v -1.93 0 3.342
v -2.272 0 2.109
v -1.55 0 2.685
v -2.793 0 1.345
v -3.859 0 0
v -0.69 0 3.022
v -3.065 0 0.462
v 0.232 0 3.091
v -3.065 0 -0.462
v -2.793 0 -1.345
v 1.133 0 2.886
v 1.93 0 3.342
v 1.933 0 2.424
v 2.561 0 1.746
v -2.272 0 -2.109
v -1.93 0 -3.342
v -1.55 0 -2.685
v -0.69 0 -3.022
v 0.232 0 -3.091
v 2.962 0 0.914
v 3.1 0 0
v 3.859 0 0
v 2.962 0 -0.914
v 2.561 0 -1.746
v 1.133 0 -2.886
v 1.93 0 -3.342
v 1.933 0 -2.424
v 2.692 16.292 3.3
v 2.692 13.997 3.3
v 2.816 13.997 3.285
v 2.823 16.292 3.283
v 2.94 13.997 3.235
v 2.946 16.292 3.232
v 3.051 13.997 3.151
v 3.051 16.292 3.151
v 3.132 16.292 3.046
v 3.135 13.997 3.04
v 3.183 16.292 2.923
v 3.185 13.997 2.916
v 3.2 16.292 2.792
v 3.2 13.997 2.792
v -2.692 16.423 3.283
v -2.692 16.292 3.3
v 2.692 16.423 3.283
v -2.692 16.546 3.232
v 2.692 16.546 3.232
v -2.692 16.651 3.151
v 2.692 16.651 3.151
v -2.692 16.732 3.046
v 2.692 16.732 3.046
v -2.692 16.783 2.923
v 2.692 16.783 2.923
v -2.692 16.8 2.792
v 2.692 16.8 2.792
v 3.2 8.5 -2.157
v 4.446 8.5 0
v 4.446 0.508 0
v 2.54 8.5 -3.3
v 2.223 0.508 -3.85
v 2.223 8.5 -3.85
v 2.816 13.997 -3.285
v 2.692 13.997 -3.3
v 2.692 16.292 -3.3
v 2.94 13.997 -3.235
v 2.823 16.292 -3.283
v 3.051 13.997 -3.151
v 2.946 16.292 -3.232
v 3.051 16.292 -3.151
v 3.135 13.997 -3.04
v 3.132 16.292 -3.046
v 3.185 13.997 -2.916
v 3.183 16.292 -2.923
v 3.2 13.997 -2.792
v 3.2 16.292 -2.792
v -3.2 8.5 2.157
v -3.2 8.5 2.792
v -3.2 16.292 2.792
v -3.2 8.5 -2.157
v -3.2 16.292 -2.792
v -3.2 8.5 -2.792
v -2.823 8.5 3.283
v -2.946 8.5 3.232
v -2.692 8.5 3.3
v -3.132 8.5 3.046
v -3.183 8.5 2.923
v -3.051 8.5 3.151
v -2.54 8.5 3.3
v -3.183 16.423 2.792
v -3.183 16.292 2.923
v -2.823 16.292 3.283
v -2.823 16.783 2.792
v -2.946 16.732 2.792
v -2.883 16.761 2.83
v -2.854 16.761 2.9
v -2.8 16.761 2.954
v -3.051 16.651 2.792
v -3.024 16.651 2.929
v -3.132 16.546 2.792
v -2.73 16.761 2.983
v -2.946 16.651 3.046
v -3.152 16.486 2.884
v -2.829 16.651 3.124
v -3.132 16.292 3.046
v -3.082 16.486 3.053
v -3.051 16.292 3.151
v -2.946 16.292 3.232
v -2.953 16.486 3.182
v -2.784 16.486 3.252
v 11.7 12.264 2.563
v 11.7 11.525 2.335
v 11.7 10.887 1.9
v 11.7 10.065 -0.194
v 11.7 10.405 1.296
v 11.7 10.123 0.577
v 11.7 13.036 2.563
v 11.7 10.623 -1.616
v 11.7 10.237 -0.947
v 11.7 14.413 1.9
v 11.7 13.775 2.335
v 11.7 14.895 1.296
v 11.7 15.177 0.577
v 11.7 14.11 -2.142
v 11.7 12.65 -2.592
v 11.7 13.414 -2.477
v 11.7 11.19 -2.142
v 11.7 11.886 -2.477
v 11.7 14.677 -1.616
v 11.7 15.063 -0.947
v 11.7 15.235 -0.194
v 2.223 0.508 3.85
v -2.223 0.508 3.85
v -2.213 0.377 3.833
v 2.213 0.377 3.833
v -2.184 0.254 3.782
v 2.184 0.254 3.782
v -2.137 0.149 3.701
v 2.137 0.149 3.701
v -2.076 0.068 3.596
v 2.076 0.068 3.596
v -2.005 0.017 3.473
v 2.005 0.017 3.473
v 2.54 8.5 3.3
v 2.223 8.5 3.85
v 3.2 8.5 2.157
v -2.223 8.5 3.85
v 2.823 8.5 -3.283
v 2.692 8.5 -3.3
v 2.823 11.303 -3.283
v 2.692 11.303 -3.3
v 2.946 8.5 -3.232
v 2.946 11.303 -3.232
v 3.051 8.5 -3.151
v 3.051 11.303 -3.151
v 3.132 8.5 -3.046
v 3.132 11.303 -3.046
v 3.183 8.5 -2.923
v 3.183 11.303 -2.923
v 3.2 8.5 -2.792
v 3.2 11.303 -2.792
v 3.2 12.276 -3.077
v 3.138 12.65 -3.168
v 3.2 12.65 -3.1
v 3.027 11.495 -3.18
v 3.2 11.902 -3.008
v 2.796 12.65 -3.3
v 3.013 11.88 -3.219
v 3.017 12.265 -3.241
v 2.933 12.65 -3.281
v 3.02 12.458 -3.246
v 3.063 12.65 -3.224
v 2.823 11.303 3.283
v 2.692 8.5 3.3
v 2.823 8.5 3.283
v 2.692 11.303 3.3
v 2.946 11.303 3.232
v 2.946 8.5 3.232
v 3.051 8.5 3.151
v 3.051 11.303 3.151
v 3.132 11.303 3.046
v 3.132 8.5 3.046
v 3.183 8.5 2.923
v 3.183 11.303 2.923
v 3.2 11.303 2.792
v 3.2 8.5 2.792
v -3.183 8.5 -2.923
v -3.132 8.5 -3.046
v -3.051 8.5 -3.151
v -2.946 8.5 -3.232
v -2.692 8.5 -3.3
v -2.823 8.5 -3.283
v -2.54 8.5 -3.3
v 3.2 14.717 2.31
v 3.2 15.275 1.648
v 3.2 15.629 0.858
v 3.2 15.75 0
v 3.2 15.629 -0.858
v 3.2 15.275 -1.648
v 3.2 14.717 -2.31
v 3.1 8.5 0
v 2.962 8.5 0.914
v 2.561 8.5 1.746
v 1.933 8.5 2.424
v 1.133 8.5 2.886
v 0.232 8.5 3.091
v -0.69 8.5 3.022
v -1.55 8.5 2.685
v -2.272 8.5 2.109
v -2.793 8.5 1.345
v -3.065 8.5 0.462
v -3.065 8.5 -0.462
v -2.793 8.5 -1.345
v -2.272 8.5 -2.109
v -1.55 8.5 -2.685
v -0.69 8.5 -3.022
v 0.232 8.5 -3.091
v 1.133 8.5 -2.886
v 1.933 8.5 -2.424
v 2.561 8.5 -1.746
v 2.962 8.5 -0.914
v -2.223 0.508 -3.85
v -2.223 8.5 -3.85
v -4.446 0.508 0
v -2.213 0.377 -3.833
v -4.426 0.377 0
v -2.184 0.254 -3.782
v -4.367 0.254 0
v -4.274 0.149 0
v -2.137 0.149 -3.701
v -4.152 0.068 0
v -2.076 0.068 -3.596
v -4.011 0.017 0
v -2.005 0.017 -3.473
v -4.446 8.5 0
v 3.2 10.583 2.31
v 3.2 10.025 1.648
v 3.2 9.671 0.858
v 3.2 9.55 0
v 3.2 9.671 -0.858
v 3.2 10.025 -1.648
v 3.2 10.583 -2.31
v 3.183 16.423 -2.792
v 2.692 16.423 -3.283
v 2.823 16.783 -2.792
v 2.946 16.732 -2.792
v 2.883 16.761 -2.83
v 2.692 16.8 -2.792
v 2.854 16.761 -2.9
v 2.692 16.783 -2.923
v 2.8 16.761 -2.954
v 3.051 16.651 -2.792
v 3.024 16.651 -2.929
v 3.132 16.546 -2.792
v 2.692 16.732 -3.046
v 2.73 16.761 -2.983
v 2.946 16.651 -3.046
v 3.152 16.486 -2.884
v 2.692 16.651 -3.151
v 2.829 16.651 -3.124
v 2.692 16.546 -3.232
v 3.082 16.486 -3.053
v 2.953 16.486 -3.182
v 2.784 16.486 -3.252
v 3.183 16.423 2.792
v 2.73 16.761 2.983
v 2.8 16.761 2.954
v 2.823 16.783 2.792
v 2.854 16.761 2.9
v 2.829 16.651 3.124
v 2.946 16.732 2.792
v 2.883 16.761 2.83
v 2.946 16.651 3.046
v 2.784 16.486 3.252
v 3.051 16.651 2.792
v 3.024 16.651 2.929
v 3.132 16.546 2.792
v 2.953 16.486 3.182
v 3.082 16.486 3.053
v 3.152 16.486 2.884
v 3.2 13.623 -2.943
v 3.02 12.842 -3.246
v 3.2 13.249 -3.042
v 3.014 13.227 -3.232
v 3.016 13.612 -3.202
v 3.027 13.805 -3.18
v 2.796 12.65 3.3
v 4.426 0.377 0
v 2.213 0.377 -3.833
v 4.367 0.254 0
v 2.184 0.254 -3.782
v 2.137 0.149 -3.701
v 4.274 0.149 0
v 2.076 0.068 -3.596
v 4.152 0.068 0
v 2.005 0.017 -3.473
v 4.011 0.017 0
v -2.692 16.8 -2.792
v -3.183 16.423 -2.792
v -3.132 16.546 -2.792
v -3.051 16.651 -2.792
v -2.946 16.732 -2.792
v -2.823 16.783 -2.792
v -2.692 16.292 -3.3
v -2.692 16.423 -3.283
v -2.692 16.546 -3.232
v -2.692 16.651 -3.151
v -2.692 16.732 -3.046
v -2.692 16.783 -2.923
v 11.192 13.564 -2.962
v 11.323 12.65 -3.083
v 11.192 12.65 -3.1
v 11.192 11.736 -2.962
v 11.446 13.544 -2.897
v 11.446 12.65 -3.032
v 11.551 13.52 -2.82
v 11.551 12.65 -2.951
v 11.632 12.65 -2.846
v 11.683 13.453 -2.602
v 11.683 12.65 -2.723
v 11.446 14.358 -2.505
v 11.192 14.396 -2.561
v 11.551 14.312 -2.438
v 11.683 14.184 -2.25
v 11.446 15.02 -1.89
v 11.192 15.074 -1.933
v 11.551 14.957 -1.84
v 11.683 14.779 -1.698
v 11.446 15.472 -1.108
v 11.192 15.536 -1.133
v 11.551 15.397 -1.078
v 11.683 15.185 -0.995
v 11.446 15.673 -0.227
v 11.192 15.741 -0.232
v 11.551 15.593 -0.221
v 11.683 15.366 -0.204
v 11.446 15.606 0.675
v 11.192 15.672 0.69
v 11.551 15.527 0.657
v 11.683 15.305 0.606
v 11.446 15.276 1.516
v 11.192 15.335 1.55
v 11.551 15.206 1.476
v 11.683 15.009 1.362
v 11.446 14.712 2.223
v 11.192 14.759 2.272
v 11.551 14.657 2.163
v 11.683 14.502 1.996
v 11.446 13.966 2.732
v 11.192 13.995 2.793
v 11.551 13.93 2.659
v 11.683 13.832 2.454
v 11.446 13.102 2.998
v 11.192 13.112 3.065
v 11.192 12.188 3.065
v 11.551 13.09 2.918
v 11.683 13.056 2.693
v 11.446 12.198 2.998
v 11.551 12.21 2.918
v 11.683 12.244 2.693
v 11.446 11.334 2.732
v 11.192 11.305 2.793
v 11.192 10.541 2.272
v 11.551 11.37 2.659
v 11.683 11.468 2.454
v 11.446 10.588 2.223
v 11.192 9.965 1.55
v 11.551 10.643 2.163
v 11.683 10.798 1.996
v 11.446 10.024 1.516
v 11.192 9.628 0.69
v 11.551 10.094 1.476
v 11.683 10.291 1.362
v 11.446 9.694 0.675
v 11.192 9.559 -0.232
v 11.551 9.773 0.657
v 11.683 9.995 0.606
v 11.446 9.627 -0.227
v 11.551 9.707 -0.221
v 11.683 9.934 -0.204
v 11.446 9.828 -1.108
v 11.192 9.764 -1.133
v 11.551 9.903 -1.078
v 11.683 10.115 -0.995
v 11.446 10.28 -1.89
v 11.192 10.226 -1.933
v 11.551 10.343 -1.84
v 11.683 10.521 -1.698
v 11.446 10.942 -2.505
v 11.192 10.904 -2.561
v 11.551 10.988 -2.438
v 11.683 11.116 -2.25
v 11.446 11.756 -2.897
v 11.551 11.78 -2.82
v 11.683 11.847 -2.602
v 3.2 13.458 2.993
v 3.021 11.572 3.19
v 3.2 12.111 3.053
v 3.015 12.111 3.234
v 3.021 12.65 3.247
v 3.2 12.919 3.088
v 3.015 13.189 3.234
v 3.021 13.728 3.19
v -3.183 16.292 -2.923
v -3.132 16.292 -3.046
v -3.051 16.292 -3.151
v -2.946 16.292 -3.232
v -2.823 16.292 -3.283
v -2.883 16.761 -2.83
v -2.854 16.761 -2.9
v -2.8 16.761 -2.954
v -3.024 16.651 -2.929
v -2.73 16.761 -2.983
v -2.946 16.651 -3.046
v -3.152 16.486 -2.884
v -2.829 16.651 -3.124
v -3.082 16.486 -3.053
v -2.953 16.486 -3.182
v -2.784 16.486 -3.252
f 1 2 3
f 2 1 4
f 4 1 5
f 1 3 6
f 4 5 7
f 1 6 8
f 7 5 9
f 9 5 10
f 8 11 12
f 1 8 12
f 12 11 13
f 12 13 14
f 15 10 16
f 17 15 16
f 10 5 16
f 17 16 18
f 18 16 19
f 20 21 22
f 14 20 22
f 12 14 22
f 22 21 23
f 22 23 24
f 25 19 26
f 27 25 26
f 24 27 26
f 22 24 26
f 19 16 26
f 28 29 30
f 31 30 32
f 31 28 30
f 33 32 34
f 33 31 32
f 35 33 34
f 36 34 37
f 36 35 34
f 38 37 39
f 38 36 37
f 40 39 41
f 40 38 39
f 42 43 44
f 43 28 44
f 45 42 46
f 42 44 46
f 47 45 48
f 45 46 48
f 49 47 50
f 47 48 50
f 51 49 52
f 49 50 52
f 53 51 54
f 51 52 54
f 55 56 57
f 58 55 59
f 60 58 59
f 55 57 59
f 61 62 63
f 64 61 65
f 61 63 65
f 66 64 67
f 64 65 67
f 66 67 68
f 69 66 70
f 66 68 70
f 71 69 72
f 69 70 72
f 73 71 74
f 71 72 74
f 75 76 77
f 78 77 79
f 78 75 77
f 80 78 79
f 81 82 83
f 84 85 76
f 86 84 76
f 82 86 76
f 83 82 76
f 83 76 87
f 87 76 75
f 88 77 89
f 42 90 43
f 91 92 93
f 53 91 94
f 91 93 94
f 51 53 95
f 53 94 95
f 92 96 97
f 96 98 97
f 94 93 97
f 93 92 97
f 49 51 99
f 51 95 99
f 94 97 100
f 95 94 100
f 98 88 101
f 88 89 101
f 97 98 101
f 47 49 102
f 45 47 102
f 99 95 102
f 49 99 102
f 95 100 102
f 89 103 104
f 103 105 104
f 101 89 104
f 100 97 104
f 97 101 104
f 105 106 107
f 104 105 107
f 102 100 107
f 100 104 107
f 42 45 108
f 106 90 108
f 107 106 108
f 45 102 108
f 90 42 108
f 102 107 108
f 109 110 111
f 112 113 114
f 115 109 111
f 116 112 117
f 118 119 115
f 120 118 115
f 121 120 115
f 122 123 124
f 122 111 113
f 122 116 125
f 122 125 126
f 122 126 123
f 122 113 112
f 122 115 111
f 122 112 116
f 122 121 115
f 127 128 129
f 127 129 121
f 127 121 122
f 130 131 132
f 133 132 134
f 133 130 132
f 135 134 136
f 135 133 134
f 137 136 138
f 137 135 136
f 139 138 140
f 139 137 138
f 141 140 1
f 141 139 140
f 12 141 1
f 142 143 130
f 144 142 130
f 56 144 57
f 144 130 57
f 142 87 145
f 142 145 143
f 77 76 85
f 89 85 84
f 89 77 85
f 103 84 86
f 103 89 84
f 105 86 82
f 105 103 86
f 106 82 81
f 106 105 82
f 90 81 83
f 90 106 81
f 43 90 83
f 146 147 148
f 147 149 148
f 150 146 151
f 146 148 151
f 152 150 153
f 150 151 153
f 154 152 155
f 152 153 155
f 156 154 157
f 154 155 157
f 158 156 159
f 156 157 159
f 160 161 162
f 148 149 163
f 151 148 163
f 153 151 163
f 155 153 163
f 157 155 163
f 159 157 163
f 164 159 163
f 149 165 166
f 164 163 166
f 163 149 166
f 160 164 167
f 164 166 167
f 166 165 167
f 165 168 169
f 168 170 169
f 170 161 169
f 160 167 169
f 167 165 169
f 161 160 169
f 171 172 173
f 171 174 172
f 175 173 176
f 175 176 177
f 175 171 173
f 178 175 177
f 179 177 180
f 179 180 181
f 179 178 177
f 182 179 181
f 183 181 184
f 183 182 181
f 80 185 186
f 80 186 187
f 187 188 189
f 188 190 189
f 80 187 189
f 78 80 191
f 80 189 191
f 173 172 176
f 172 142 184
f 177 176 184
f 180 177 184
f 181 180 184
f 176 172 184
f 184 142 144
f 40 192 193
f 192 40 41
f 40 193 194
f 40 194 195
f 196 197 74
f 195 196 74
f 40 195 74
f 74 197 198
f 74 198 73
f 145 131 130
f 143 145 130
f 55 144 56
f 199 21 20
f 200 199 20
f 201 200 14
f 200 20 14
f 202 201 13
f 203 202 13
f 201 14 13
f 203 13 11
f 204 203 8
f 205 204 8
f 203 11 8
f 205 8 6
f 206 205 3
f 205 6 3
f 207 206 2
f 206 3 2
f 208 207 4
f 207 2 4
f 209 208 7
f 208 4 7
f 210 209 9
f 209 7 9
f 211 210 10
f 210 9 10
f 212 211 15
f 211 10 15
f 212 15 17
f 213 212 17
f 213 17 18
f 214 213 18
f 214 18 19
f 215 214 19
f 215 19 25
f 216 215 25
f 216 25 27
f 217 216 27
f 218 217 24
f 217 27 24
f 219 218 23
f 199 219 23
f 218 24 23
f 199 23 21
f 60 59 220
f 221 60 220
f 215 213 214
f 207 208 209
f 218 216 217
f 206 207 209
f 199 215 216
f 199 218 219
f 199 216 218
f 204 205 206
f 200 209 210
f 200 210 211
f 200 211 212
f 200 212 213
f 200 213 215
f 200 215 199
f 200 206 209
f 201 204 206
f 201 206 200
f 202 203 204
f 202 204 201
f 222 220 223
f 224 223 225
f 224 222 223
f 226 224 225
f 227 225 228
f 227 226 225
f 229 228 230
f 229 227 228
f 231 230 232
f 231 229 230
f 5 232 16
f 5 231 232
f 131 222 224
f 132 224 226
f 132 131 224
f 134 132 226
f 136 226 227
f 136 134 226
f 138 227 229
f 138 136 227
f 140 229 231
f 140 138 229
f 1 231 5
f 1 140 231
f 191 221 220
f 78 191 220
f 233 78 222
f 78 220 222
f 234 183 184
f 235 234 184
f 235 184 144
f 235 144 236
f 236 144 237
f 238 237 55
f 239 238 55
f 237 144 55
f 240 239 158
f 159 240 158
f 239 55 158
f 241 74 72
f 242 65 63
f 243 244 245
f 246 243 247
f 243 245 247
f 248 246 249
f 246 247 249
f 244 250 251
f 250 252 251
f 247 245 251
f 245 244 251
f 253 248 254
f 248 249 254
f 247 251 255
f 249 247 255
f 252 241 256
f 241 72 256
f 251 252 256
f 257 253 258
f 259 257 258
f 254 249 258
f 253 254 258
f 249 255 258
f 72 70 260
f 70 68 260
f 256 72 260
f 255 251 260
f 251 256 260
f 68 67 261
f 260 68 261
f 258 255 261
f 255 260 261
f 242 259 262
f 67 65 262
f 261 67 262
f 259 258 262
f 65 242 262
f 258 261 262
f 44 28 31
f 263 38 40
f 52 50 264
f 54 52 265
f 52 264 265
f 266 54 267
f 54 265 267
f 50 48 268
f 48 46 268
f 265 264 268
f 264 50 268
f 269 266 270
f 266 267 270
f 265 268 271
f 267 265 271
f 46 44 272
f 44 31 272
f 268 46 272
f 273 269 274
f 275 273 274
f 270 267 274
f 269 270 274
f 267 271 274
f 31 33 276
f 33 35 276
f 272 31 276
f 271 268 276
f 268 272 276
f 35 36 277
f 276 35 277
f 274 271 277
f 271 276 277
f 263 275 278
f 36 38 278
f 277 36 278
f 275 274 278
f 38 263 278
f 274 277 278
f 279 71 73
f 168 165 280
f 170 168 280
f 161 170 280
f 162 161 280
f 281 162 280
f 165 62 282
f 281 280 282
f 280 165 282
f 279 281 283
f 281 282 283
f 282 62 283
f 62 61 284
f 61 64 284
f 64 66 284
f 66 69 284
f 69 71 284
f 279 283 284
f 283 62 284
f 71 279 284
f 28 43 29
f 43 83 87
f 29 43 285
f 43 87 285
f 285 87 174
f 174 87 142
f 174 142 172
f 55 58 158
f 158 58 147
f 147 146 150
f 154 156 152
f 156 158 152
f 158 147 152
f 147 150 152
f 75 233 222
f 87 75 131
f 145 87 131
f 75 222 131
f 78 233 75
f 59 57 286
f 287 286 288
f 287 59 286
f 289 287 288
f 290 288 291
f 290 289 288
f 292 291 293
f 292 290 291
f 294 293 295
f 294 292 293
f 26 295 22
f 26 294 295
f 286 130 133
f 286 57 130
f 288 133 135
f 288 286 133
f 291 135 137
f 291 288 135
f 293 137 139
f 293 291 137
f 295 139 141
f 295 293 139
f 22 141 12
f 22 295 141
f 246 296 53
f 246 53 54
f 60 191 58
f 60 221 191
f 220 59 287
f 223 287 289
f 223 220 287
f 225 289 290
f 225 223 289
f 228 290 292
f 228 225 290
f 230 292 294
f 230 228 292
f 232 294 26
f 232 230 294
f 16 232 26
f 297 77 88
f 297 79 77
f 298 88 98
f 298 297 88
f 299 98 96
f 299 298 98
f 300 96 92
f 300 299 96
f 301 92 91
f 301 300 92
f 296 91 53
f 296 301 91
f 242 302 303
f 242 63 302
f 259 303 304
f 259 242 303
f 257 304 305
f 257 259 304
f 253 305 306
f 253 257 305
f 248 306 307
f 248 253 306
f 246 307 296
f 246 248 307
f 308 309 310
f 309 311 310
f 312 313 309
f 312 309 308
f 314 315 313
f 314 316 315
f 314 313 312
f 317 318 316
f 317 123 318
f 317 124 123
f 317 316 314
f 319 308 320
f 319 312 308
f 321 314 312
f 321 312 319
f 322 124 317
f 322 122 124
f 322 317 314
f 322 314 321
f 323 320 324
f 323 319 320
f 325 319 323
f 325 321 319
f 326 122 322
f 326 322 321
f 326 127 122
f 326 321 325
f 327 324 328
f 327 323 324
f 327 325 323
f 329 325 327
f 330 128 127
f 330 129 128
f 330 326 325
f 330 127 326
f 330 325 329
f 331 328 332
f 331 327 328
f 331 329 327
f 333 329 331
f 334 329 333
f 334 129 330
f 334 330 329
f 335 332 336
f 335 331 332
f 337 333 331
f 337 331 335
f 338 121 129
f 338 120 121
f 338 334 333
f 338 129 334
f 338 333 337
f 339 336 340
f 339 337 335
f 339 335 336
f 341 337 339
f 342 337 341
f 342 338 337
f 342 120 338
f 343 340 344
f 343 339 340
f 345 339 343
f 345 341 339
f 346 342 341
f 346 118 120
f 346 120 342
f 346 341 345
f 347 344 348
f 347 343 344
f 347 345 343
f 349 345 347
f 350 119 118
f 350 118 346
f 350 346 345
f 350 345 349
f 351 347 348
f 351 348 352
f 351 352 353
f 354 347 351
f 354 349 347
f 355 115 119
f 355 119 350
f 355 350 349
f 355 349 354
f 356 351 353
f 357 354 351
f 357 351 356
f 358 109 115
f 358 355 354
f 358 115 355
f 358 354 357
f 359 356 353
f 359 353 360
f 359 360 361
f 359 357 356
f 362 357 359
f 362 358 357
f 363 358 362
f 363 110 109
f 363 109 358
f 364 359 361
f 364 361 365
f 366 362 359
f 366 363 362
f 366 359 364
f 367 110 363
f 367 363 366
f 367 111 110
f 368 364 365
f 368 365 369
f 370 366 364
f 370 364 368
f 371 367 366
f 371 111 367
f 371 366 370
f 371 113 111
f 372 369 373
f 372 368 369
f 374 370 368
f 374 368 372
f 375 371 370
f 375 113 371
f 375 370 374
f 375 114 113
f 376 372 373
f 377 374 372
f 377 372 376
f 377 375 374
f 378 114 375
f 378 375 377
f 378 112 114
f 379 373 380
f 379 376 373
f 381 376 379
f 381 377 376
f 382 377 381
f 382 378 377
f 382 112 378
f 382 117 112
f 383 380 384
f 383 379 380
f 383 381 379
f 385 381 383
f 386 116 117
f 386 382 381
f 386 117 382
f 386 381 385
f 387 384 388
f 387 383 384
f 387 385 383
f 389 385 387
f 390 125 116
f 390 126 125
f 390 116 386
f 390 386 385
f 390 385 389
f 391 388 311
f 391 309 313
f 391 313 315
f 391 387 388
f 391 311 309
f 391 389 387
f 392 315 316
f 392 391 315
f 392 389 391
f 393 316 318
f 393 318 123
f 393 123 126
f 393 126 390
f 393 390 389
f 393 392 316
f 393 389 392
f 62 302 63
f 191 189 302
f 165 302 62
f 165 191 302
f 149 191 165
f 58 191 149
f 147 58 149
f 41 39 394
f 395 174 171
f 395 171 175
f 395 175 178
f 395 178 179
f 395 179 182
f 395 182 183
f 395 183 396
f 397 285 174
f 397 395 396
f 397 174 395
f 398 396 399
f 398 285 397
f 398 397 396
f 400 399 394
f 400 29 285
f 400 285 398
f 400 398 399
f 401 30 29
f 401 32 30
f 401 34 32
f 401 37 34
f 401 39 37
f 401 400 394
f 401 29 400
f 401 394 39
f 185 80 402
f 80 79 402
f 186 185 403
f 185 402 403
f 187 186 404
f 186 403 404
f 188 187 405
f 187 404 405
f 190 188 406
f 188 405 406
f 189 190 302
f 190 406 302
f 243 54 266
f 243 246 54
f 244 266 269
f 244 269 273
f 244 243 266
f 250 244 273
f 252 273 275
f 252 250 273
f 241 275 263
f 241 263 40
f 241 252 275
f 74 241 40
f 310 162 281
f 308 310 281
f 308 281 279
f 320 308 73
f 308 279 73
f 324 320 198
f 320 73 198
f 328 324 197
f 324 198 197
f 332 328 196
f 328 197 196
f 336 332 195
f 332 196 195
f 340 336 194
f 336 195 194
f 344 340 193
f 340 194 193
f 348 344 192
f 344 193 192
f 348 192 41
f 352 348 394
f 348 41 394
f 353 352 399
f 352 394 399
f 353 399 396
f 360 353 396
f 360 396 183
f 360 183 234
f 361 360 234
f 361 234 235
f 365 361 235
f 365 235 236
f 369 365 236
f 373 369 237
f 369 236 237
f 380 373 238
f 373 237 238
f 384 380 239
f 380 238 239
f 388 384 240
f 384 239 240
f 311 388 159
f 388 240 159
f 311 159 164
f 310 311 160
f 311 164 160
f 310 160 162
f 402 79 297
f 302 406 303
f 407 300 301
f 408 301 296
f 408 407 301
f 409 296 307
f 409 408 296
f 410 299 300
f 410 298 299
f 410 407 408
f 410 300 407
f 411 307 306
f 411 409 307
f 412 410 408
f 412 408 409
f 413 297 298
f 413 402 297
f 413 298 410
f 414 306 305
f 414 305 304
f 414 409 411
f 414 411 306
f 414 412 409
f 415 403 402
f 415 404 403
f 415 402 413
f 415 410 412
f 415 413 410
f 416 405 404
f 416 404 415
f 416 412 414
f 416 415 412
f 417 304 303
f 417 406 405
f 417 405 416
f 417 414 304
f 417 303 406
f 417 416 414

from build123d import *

# Parameters (mm, degrees)
BOSS_EXTRUDE1_DEPTH = 8.5
SKETCH2_W           = 6.4
SKETCH2_H           = 6.6
BOSS_EXTRUDE2_DEPTH = 8.3
SKETCH3_R           = 3.1
BOSS_EXTRUDE3_DEPTH = 8.5
SKETCH4_R           = 3.1
CUT_EXTRUDE1_DEPTH  = 8.5
FILLET1_R           = 0.508


with BuildPart() as part:
    # Sketch1 → Boss-Extrude1 (new body)
    with BuildSketch(Plane(origin=(0, 0, 0), x_dir=(1, 0, 0), z_dir=(0, 1, 0))):
        Polygon((4.445597073, 0), (2.222798536, 3.85), (-2.222798536, 3.85), (-4.445597073, 0), (-2.222798536, -3.85), (2.222798536, -3.85), align=None)
    extrude(amount=BOSS_EXTRUDE1_DEPTH)

    # Sketch2 → Boss-Extrude2 (add)
    with BuildSketch(Plane(origin=(0, 8.5, 0), x_dir=(1, 0, 0), z_dir=(0, 1, 0))):
        Rectangle(SKETCH2_W, SKETCH2_H)
    extrude(amount=BOSS_EXTRUDE2_DEPTH)

    # Sketch3 → Boss-Extrude3 (add)
    with BuildSketch(Plane(origin=(3.2, 0, 0), x_dir=(0, 0, -1), z_dir=(1, 0, 0))):
        with Locations((0, 12.65)):
            Circle(SKETCH3_R)
    extrude(amount=BOSS_EXTRUDE3_DEPTH)

    # Sketch4 → Cut-Extrude1 (cut)
    with BuildSketch(Plane.XZ):
        Circle(SKETCH4_R)
    extrude(amount=-CUT_EXTRUDE1_DEPTH, mode=Mode.SUBTRACT)

    # Fillet1
    fillet1_edges = [part.edges().sort_by_distance(p)[0] for p in [
        (-3.2, 12.65, -3.3),
        (-3.2, 12.65, 3.3),
        (3.2, 12.65, 3.3),
        (3.2, 12.65, -3.3),
        (-3.2, 16.8, 0),
        (0, 16.8, 3.3),
        (3.2, 16.8, 0),
        (0, 16.8, -3.3),
        (11.7, 12.65, 3.1),
        (0, 0, 3.85),
        (-3.334197805, 0, 1.925),
        (-3.334197805, 0, -1.925),
        (0, 0, -3.85),
        (3.334197805, 0, -1.925),
        (3.334197805, 0, 1.925),
    ]]
    fillet(fillet1_edges, radius=FILLET1_R)


solid = part.part
